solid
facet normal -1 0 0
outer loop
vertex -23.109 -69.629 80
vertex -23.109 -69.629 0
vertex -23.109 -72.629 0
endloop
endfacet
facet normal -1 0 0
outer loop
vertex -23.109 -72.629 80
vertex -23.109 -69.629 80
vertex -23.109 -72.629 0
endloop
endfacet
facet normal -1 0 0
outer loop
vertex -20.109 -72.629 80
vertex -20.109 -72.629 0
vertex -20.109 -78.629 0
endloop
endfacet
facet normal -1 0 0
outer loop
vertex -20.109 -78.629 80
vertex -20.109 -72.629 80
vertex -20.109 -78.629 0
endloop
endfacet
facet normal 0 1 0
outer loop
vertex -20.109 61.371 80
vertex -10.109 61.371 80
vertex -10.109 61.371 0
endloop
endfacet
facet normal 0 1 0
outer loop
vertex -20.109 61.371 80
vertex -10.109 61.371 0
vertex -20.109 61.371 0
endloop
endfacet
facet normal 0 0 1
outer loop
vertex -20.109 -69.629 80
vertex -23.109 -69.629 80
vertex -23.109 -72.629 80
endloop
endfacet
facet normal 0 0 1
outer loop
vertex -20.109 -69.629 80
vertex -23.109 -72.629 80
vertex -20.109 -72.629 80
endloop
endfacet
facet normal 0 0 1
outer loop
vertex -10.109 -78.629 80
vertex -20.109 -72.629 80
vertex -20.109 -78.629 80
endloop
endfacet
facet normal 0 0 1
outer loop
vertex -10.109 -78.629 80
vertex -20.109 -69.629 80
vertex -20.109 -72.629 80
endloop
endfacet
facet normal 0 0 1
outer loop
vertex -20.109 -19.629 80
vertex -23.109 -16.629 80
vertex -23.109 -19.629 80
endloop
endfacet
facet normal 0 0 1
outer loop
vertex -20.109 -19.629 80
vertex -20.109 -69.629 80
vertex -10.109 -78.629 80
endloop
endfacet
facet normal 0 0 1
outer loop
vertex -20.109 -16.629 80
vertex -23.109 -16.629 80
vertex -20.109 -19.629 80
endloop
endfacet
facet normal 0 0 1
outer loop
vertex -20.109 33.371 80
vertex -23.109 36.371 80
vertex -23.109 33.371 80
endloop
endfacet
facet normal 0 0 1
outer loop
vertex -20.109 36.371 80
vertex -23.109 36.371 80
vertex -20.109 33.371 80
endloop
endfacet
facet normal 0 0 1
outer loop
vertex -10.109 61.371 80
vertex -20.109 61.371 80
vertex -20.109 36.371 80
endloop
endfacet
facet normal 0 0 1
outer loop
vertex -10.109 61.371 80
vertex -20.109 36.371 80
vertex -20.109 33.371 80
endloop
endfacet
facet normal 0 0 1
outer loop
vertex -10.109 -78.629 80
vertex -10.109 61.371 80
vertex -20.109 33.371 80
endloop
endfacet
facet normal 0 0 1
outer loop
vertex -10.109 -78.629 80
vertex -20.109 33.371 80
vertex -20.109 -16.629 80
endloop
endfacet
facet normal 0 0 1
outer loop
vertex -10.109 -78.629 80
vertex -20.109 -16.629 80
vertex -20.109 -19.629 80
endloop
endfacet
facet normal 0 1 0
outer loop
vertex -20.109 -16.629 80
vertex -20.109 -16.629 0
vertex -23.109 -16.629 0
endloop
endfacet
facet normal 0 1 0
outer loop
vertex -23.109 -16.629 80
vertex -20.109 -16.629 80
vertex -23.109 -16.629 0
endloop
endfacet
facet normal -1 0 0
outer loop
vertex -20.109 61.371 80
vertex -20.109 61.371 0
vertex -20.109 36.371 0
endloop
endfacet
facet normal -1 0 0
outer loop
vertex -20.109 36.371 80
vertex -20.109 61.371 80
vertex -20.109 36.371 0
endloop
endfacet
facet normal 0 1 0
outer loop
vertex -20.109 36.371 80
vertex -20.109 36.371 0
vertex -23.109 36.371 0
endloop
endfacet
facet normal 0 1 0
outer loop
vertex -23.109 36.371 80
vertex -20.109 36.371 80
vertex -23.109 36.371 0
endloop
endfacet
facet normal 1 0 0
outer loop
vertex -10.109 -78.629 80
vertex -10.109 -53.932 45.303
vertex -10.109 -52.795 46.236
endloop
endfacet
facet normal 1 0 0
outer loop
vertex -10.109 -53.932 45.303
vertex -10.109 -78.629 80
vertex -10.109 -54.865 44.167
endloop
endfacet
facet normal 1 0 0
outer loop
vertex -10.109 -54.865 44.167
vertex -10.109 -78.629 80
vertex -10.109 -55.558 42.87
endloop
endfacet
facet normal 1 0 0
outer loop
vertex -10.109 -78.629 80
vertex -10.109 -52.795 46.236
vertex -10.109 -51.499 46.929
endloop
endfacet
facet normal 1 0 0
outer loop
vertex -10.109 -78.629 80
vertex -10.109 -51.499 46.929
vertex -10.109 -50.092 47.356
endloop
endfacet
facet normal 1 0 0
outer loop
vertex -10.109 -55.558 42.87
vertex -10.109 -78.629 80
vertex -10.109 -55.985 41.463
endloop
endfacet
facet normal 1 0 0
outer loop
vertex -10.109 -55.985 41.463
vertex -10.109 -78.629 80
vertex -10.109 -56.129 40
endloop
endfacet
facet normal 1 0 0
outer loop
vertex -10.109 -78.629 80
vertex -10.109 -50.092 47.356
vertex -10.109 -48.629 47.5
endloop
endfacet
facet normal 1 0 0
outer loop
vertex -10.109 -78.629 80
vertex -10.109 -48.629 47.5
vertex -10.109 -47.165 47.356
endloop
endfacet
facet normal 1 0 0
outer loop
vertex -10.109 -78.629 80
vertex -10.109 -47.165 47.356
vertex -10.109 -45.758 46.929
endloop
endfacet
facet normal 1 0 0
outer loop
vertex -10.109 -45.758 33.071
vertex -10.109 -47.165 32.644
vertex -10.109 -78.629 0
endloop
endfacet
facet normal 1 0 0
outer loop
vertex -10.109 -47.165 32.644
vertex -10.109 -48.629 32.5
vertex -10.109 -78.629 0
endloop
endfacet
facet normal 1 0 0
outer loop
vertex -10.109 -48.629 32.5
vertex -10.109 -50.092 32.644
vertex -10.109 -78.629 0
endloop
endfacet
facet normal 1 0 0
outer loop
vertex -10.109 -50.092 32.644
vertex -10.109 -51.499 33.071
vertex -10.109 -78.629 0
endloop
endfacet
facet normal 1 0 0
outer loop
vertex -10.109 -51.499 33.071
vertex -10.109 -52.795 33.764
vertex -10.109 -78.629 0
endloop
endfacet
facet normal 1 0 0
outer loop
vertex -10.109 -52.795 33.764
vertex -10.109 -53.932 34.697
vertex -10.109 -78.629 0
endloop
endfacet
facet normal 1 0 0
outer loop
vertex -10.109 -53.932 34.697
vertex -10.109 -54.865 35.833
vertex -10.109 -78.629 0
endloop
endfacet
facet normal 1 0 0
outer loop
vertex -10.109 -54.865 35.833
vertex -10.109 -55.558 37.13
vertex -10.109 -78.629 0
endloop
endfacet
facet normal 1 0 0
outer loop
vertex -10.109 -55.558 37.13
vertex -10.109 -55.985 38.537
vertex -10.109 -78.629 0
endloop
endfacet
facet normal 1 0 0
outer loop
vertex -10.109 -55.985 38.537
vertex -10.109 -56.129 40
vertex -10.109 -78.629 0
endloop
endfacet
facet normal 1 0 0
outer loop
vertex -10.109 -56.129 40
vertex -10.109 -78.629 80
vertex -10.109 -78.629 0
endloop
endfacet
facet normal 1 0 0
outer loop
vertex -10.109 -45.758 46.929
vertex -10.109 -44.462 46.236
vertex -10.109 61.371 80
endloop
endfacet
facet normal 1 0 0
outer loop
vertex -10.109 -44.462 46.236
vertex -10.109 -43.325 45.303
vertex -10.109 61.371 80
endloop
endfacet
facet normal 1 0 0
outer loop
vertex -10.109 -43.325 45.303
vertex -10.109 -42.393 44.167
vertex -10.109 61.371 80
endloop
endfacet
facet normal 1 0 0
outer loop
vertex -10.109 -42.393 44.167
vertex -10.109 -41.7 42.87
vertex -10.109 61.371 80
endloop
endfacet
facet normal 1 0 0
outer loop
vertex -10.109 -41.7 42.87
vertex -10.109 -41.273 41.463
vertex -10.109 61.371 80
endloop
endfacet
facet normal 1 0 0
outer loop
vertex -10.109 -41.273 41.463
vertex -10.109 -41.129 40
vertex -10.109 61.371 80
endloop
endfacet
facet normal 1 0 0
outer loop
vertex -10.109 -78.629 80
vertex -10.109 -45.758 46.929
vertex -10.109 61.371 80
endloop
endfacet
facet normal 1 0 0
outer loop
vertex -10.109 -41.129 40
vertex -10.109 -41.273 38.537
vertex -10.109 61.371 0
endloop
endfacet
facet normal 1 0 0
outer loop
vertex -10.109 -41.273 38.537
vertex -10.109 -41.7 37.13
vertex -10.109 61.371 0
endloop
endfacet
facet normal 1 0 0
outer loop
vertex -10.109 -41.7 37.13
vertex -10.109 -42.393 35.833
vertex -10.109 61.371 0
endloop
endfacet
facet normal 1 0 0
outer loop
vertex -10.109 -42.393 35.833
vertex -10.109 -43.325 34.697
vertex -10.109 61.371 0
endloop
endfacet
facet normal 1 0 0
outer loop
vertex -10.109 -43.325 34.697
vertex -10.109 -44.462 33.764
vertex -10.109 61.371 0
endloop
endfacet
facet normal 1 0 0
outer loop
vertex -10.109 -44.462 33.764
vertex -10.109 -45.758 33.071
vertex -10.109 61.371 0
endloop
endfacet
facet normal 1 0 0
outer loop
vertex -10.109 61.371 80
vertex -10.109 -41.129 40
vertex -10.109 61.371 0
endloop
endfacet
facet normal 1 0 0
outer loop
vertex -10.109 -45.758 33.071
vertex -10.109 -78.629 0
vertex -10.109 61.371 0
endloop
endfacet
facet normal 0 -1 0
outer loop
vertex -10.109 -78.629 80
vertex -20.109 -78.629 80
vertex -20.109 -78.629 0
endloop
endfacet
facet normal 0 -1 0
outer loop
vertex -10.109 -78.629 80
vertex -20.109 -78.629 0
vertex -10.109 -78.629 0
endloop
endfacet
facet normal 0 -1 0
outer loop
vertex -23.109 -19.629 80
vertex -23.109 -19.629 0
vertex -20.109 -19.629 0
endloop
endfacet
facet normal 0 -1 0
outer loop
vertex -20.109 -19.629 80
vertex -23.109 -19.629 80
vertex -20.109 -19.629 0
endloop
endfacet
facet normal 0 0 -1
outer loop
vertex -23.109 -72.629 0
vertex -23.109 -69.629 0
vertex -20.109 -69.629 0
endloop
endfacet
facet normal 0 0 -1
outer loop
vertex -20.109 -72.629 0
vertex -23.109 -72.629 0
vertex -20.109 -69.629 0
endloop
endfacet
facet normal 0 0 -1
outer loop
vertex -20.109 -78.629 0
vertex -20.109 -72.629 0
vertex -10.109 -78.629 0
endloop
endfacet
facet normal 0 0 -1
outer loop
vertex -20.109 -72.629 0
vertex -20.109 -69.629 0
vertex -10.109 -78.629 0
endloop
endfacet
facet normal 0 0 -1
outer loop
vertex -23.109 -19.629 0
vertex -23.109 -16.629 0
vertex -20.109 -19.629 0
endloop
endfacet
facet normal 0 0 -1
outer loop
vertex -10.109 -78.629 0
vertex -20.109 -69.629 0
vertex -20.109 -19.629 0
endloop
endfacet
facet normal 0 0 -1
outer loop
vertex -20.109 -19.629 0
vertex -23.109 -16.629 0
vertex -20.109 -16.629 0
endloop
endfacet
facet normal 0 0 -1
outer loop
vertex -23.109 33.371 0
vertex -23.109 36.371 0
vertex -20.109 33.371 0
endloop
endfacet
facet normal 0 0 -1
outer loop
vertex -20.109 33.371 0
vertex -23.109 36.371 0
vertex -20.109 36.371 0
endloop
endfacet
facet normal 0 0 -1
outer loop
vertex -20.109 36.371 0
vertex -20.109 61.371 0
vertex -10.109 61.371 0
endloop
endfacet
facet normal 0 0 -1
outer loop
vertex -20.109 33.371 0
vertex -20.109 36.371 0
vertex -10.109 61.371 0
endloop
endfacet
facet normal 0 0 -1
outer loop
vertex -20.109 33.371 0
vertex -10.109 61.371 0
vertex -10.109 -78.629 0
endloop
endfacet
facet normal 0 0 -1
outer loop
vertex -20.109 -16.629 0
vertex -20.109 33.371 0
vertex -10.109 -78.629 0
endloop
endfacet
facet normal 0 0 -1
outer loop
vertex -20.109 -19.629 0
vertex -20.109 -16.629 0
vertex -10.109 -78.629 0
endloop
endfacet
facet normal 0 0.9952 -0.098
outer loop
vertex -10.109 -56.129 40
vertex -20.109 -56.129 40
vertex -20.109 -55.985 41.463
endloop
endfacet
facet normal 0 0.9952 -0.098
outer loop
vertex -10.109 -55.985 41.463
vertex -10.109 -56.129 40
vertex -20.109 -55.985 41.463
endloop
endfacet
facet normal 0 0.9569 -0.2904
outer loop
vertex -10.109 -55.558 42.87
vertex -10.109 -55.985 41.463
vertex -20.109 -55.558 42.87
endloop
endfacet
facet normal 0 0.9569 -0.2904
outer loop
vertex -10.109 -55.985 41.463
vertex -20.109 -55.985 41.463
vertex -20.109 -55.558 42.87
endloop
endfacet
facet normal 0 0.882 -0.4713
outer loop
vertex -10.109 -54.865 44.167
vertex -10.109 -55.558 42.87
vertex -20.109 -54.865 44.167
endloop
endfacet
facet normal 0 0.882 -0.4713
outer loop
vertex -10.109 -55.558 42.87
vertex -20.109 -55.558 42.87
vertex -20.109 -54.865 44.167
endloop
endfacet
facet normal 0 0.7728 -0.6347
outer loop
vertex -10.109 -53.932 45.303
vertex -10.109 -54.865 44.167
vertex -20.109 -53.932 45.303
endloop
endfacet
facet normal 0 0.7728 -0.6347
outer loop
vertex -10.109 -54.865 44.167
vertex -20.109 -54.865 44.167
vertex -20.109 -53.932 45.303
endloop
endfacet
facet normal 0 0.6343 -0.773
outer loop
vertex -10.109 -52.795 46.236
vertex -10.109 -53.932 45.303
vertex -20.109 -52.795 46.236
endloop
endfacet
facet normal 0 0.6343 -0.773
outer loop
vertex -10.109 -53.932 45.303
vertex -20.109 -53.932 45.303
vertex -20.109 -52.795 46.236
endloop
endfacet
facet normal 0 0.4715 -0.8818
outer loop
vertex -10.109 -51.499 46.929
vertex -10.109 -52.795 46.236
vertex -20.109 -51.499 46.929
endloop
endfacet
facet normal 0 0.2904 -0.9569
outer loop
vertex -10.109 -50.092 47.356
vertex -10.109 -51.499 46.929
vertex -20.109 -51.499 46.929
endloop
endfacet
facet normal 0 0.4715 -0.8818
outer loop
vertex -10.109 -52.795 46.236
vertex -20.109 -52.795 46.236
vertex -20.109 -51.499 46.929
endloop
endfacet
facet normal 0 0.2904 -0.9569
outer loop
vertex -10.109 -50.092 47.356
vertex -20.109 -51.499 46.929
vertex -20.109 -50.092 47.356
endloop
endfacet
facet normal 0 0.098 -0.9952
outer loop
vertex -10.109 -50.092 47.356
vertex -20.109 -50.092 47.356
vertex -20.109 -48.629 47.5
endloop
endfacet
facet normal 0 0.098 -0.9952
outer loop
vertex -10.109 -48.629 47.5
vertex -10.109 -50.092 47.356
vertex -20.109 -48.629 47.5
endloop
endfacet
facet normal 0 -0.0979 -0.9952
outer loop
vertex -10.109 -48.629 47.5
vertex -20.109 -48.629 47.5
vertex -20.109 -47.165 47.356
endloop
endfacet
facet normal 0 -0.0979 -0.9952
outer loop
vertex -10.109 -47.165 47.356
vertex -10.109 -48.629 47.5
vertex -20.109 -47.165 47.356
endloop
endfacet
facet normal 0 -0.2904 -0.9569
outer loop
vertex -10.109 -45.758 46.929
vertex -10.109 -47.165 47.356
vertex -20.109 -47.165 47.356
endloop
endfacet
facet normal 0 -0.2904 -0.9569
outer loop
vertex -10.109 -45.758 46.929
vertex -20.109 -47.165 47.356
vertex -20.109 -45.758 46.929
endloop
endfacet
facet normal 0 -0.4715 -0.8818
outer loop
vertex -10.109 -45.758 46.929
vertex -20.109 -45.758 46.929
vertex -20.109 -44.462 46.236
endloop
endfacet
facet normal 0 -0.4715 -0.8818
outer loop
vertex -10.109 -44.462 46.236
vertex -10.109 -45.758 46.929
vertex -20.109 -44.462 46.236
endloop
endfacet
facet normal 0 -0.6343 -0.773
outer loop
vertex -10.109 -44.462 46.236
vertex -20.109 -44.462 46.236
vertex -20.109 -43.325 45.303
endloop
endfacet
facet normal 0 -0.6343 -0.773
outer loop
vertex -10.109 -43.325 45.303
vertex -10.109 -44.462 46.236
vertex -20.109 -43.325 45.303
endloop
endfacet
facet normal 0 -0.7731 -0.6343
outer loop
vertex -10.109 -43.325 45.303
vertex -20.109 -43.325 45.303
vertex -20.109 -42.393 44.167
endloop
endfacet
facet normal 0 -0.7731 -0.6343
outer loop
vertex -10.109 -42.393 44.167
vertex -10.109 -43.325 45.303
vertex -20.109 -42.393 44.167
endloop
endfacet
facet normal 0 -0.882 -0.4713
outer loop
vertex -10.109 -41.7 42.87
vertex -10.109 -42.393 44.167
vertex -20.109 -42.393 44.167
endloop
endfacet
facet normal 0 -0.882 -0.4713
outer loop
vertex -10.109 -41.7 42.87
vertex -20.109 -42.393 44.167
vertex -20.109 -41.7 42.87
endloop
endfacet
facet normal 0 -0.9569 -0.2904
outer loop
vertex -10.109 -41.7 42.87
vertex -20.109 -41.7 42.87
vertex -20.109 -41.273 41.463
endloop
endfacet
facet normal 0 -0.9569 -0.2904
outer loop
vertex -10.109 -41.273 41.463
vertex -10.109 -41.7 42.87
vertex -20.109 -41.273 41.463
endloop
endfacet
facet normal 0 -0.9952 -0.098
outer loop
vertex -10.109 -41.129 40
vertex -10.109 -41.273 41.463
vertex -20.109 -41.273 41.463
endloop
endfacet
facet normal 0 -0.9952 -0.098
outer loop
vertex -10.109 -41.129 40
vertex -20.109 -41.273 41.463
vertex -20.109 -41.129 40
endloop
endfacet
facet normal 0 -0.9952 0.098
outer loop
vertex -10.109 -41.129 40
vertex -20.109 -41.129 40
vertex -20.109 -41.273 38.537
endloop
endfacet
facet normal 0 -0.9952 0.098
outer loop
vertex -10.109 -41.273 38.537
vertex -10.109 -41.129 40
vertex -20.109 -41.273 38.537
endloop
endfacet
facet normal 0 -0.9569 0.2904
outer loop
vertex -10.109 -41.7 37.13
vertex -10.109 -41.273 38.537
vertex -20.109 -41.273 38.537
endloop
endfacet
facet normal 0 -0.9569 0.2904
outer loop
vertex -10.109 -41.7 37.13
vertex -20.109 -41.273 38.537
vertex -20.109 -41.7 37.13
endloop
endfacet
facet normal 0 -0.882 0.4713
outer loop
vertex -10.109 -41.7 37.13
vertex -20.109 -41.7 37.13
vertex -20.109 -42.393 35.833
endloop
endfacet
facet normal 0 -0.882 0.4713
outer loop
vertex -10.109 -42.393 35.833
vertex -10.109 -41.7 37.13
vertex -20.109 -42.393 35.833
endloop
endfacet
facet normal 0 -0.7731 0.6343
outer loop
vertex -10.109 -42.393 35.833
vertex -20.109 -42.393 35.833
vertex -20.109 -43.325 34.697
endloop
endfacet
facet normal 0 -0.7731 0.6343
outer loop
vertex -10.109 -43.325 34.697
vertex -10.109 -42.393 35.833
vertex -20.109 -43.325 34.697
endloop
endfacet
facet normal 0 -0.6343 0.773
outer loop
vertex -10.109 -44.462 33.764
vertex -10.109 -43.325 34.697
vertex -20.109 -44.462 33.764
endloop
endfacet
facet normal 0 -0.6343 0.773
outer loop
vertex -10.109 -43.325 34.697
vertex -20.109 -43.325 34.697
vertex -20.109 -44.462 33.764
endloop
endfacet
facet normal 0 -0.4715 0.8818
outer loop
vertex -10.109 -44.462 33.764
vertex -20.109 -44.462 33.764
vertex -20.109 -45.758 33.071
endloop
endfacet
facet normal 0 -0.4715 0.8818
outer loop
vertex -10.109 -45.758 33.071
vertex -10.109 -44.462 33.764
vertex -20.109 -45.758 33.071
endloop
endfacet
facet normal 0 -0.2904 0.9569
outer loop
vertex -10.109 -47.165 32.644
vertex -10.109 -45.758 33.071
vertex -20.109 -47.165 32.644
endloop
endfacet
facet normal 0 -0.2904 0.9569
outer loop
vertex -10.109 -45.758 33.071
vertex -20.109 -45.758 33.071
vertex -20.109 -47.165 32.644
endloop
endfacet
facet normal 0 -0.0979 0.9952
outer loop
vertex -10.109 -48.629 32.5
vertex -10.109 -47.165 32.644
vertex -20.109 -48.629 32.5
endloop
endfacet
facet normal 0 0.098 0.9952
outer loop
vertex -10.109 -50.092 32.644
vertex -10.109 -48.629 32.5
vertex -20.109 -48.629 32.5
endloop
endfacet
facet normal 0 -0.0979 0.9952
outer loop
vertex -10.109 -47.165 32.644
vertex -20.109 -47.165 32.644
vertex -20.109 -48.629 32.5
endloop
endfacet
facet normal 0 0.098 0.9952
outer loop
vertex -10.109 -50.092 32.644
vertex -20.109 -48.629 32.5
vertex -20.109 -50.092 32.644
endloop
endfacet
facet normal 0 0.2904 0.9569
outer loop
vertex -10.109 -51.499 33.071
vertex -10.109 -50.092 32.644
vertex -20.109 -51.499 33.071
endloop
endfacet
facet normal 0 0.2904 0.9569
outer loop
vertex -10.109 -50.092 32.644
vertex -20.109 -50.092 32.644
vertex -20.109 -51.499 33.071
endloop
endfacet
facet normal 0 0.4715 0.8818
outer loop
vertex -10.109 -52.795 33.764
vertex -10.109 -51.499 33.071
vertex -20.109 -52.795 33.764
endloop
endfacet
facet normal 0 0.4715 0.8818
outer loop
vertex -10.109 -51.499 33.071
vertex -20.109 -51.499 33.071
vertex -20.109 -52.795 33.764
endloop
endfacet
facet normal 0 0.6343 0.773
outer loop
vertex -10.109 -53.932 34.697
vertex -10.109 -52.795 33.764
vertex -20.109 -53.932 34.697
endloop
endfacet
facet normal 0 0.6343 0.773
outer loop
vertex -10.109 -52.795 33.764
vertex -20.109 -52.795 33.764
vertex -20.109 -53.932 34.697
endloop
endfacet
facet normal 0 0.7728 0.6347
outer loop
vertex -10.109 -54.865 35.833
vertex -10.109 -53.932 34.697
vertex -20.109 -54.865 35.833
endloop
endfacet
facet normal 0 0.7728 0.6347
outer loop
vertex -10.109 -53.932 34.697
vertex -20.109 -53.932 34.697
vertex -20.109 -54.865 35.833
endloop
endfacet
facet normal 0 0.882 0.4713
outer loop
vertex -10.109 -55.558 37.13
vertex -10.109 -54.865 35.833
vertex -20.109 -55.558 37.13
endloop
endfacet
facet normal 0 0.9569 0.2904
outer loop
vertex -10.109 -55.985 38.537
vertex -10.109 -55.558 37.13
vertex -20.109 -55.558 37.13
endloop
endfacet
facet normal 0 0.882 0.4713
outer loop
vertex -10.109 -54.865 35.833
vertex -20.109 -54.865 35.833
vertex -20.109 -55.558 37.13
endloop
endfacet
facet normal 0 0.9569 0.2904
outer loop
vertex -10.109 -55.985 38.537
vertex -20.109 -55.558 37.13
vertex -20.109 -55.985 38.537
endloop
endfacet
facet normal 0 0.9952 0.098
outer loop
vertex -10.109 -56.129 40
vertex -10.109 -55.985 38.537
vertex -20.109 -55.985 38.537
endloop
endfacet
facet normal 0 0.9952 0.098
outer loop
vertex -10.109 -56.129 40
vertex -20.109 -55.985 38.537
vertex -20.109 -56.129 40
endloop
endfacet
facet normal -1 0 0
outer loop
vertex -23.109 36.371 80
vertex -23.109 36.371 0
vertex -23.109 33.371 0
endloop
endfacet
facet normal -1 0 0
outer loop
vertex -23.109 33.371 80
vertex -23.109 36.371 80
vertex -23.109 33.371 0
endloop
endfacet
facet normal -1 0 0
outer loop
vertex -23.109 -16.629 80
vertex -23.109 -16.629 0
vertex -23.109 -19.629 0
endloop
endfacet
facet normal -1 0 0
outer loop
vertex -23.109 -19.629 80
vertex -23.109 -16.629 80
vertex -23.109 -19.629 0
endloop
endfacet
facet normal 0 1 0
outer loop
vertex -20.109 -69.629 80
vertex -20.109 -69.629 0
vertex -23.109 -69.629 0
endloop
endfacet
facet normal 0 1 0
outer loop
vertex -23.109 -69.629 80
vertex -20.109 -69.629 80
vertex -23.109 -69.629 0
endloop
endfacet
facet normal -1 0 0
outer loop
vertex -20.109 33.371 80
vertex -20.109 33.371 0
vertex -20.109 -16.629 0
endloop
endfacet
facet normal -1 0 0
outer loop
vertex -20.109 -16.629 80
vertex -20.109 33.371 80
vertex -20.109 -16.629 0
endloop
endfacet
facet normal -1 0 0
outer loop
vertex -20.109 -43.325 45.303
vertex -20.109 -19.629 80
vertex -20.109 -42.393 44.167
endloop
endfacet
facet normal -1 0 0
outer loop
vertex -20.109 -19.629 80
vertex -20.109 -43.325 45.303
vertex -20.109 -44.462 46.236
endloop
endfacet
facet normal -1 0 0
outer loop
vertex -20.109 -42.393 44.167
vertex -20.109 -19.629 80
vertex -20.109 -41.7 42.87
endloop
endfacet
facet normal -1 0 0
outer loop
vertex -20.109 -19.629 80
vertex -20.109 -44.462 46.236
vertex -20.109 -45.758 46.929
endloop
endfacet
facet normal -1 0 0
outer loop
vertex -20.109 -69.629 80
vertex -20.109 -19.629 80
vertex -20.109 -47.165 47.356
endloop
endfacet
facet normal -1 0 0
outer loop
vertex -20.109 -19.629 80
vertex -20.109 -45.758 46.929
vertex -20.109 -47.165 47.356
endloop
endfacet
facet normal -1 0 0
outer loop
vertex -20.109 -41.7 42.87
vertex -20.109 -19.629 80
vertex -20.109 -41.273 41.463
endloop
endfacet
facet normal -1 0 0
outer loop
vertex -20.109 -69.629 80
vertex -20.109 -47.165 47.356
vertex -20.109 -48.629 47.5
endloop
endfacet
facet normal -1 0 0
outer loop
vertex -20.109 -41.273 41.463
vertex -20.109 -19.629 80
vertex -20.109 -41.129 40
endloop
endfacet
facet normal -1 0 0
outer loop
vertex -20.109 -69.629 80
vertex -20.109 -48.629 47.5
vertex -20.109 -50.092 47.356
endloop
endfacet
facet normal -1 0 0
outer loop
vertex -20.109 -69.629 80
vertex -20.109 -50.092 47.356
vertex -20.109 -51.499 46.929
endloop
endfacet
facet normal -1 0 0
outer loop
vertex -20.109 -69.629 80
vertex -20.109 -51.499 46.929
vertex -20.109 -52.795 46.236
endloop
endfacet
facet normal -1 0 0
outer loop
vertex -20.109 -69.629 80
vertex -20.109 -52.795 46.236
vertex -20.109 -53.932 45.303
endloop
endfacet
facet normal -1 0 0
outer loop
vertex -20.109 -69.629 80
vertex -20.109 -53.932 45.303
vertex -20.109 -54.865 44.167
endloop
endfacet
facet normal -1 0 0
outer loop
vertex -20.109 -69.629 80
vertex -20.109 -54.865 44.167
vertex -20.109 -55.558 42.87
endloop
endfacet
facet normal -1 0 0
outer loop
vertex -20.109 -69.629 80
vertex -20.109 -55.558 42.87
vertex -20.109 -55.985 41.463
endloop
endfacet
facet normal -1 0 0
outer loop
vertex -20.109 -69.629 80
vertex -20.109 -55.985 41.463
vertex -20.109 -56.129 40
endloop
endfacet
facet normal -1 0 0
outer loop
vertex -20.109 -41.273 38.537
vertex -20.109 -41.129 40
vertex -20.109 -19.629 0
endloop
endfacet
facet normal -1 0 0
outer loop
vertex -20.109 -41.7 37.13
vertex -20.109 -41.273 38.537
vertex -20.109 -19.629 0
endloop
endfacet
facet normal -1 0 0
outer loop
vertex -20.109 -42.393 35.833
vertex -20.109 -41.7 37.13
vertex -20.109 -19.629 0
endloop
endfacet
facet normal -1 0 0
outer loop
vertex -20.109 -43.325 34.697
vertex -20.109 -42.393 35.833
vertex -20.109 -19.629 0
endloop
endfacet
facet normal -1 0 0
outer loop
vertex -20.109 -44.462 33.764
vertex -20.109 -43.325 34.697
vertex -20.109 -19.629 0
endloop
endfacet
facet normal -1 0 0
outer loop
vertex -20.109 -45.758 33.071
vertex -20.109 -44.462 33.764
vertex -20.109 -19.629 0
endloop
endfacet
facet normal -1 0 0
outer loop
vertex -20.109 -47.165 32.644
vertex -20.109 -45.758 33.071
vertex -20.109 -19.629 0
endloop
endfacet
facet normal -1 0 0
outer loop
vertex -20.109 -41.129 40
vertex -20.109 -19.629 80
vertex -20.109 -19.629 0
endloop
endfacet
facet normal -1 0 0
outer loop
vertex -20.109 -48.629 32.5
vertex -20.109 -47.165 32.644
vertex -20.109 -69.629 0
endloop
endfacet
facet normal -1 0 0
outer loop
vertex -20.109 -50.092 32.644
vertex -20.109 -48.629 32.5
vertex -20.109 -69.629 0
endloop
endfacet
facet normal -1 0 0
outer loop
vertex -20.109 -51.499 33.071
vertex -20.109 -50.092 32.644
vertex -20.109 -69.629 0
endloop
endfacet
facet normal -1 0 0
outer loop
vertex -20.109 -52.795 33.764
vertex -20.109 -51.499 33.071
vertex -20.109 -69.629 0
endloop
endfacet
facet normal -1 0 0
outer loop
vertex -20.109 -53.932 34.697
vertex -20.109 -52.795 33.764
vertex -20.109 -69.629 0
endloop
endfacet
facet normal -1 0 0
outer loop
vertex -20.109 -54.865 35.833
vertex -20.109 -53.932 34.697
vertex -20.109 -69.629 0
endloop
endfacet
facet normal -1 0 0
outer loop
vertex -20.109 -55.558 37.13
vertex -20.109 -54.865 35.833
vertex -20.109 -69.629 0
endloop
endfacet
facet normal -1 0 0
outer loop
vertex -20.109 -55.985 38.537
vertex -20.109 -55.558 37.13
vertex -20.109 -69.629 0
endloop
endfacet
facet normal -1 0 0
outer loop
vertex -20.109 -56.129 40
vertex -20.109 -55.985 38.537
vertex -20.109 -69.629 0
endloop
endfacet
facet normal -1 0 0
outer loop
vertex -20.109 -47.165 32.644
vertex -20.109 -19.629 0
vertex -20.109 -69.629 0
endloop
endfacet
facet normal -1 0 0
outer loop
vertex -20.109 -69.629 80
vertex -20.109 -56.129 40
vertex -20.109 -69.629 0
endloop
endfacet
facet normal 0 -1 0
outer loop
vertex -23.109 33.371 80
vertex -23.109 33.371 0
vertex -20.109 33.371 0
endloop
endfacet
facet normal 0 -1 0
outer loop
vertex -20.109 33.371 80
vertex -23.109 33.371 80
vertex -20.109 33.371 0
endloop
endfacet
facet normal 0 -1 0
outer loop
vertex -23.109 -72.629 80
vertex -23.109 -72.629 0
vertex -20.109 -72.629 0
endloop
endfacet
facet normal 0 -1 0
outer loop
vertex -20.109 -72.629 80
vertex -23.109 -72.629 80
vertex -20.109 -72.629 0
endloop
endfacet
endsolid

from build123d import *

# Parameters (mm, degrees)
BOSS_EXTRUDE1_DEPTH = 80
SKETCH2_R           = 7.5
CUT_EXTRUDE1_DEPTH  = 80


with BuildPart() as part:
    # Sketch1 → Boss-Extrude1 (new body)
    with BuildSketch(Plane.XY):
        Polygon((-10.10866575, -78.628610729), (-10.10866575, 61.371389271), (-20.10866575, 61.371389271), (-20.10866575, 36.371389271), (-23.10866575, 36.371389271), (-23.10866575, 33.371389271), (-20.10866575, 33.371389271), (-20.10866575, -16.628610729), (-23.10866575, -16.628610729), (-23.10866575, -19.628610729), (-20.10866575, -19.628610729), (-20.10866575, -69.628610729), (-23.10866575, -69.628610729), (-23.10866575, -72.628610729), (-20.10866575, -72.628610729), (-20.10866575, -78.628610729), align=None)
    extrude(amount=BOSS_EXTRUDE1_DEPTH)

    # Sketch2 → Cut-Extrude1 (cut)
    with BuildSketch(Plane.ZY.offset(20.10866575)):
        with Locations(Location((40, -48.628610729, 0), (0, 0, 270))):
            Circle(SKETCH2_R)
    extrude(amount=-CUT_EXTRUDE1_DEPTH, mode=Mode.SUBTRACT)


solid = part.part
